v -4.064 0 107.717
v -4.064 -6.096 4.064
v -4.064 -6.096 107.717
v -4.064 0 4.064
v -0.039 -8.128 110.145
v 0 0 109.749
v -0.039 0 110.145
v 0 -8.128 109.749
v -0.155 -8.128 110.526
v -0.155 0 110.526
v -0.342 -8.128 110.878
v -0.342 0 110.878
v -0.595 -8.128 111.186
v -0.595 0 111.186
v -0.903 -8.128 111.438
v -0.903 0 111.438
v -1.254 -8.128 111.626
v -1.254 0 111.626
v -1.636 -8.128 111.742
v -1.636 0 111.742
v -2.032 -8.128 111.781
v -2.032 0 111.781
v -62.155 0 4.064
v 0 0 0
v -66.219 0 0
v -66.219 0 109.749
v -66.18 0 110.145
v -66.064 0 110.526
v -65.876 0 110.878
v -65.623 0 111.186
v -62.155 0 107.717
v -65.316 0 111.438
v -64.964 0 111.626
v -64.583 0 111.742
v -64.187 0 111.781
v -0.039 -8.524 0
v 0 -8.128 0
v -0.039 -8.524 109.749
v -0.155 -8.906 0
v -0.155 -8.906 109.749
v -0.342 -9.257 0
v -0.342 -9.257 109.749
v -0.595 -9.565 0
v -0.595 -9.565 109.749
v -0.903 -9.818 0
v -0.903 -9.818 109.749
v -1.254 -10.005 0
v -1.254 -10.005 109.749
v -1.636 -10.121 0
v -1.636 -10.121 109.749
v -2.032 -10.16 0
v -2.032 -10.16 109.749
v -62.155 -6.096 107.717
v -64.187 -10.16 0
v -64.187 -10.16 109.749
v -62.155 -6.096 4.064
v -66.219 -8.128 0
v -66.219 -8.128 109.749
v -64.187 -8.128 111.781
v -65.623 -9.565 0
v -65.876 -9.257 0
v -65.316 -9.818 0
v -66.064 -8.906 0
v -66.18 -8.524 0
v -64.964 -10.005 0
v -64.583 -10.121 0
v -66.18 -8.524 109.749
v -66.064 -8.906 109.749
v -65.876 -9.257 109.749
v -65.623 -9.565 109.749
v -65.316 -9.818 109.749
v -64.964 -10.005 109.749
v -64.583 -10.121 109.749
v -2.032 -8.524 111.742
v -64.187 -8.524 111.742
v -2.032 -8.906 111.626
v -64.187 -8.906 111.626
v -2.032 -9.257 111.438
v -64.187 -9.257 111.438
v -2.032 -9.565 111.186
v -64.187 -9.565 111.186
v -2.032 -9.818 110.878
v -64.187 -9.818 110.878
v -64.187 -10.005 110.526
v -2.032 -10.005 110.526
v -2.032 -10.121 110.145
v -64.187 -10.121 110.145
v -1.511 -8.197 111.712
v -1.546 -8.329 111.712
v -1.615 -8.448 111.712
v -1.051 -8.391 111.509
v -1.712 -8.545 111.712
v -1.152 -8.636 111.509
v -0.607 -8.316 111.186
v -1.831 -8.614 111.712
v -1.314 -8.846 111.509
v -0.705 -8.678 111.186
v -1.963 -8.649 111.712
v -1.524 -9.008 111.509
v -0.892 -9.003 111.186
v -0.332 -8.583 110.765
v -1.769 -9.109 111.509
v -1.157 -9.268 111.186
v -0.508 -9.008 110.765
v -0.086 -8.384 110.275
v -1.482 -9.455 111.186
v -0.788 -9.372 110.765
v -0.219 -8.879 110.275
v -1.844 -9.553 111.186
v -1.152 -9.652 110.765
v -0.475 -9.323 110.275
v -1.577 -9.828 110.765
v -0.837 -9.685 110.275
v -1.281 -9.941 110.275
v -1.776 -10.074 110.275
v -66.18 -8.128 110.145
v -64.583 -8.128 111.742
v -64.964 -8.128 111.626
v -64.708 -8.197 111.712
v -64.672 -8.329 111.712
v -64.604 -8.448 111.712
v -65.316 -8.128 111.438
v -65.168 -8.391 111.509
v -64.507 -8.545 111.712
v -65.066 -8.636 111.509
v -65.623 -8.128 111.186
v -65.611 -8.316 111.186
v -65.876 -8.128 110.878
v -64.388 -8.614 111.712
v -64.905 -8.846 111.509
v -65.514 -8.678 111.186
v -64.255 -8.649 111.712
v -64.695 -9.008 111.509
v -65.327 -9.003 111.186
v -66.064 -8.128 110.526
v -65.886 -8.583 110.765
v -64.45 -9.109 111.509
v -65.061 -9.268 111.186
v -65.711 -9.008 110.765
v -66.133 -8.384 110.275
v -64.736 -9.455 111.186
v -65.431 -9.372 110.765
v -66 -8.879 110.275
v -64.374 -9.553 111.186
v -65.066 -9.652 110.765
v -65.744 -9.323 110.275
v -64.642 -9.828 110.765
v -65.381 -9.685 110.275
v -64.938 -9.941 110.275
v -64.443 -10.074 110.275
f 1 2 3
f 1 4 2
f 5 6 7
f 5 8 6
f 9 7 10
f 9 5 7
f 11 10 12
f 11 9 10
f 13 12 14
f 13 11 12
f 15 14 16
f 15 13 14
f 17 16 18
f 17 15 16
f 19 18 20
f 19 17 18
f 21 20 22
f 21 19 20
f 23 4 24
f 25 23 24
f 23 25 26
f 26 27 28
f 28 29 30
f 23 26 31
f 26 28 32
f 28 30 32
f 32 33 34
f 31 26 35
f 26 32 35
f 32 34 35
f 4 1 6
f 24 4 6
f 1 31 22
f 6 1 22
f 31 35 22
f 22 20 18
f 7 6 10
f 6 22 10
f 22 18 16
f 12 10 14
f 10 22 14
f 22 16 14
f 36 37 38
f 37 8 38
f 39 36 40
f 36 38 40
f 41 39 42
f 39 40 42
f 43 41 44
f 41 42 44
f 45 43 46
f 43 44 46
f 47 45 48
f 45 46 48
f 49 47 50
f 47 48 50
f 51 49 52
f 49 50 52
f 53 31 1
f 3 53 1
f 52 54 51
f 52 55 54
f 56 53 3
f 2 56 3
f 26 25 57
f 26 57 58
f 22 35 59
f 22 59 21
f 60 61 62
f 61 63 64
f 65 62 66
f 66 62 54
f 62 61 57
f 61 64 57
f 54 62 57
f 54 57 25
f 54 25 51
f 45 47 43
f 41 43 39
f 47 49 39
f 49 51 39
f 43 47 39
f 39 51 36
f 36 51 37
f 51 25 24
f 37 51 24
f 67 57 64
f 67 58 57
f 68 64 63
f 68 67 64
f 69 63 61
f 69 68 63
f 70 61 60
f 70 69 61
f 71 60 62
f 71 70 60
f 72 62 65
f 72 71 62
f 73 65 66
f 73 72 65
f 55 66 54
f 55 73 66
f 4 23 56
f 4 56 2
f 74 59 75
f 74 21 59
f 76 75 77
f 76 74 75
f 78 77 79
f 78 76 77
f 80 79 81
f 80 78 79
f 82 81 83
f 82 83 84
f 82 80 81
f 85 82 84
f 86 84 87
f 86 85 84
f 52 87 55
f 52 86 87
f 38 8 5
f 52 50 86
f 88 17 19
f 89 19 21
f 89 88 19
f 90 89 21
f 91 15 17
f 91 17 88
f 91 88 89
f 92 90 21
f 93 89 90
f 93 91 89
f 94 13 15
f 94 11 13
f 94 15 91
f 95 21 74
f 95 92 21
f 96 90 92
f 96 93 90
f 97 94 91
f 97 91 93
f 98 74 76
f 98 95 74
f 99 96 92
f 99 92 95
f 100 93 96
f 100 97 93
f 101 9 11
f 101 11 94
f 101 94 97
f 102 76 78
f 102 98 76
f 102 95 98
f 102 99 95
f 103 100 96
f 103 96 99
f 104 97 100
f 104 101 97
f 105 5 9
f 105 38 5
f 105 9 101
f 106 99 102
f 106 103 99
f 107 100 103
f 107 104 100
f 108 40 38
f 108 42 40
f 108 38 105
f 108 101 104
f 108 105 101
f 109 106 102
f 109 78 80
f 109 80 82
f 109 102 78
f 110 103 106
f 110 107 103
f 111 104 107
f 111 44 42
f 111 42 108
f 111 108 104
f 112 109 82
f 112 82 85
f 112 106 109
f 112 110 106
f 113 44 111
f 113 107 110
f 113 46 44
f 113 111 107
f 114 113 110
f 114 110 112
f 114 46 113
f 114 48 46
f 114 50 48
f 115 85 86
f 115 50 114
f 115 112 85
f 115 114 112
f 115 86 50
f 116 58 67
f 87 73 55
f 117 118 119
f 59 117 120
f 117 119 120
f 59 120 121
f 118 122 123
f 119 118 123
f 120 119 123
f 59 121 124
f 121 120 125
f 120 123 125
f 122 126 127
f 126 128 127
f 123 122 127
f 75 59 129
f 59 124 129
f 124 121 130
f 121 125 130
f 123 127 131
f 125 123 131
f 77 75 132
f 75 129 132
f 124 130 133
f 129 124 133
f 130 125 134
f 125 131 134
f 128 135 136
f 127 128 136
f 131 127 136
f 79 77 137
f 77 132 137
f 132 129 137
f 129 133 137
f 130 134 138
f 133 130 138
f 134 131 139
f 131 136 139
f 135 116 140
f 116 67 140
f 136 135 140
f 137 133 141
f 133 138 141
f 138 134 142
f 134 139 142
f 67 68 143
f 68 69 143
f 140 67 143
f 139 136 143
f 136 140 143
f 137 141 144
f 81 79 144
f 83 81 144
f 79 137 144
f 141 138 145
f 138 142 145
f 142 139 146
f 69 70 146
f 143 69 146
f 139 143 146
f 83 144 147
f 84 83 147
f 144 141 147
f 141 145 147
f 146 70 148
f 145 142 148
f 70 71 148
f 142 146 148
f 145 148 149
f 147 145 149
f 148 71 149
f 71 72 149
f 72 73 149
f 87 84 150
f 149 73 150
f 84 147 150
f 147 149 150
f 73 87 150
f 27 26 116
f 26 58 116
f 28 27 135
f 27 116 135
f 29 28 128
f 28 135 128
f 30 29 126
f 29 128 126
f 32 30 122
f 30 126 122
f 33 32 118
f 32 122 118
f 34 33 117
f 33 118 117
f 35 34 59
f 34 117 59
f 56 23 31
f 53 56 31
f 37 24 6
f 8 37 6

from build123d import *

# Parameters (mm, degrees)
F0_W     = 66.2185922265
F0_H     = 111.7807626724
F1_DEPTH = 10.16
F2_R     = 2.032
F3_T     = -4.064


# Not quite as in the source:
# - two fillets or chamfers of one size are made in one step


with BuildPart() as f1:
    # F0 (on Front) → F1 (new body)
    with BuildSketch(Plane.XZ):
        with Locations((-33.1092961133, 55.8903813362)):
            Rectangle(F0_W, F0_H)
    extrude(amount=F1_DEPTH)

    # F2
    f2_edges = [f1.edges().sort_by_distance(p)[0] for p in [
        (0, -10.16, 55.890381),
        (-66.218592, -10.16, 55.890381),
        (0, -5.08, 111.780763),
        (-66.218592, -5.08, 111.780763),
        (-33.109296, -10.16, 111.780763),
    ]]
    fillet(f2_edges, radius=F2_R)

    # F3
    f3_openings = [f1.faces().sort_by_distance(p)[0] for p in [
        (-33.109296, 0, 55.877105),
    ]]
    offset(amount=F3_T, openings=f3_openings)


solid = f1.part
